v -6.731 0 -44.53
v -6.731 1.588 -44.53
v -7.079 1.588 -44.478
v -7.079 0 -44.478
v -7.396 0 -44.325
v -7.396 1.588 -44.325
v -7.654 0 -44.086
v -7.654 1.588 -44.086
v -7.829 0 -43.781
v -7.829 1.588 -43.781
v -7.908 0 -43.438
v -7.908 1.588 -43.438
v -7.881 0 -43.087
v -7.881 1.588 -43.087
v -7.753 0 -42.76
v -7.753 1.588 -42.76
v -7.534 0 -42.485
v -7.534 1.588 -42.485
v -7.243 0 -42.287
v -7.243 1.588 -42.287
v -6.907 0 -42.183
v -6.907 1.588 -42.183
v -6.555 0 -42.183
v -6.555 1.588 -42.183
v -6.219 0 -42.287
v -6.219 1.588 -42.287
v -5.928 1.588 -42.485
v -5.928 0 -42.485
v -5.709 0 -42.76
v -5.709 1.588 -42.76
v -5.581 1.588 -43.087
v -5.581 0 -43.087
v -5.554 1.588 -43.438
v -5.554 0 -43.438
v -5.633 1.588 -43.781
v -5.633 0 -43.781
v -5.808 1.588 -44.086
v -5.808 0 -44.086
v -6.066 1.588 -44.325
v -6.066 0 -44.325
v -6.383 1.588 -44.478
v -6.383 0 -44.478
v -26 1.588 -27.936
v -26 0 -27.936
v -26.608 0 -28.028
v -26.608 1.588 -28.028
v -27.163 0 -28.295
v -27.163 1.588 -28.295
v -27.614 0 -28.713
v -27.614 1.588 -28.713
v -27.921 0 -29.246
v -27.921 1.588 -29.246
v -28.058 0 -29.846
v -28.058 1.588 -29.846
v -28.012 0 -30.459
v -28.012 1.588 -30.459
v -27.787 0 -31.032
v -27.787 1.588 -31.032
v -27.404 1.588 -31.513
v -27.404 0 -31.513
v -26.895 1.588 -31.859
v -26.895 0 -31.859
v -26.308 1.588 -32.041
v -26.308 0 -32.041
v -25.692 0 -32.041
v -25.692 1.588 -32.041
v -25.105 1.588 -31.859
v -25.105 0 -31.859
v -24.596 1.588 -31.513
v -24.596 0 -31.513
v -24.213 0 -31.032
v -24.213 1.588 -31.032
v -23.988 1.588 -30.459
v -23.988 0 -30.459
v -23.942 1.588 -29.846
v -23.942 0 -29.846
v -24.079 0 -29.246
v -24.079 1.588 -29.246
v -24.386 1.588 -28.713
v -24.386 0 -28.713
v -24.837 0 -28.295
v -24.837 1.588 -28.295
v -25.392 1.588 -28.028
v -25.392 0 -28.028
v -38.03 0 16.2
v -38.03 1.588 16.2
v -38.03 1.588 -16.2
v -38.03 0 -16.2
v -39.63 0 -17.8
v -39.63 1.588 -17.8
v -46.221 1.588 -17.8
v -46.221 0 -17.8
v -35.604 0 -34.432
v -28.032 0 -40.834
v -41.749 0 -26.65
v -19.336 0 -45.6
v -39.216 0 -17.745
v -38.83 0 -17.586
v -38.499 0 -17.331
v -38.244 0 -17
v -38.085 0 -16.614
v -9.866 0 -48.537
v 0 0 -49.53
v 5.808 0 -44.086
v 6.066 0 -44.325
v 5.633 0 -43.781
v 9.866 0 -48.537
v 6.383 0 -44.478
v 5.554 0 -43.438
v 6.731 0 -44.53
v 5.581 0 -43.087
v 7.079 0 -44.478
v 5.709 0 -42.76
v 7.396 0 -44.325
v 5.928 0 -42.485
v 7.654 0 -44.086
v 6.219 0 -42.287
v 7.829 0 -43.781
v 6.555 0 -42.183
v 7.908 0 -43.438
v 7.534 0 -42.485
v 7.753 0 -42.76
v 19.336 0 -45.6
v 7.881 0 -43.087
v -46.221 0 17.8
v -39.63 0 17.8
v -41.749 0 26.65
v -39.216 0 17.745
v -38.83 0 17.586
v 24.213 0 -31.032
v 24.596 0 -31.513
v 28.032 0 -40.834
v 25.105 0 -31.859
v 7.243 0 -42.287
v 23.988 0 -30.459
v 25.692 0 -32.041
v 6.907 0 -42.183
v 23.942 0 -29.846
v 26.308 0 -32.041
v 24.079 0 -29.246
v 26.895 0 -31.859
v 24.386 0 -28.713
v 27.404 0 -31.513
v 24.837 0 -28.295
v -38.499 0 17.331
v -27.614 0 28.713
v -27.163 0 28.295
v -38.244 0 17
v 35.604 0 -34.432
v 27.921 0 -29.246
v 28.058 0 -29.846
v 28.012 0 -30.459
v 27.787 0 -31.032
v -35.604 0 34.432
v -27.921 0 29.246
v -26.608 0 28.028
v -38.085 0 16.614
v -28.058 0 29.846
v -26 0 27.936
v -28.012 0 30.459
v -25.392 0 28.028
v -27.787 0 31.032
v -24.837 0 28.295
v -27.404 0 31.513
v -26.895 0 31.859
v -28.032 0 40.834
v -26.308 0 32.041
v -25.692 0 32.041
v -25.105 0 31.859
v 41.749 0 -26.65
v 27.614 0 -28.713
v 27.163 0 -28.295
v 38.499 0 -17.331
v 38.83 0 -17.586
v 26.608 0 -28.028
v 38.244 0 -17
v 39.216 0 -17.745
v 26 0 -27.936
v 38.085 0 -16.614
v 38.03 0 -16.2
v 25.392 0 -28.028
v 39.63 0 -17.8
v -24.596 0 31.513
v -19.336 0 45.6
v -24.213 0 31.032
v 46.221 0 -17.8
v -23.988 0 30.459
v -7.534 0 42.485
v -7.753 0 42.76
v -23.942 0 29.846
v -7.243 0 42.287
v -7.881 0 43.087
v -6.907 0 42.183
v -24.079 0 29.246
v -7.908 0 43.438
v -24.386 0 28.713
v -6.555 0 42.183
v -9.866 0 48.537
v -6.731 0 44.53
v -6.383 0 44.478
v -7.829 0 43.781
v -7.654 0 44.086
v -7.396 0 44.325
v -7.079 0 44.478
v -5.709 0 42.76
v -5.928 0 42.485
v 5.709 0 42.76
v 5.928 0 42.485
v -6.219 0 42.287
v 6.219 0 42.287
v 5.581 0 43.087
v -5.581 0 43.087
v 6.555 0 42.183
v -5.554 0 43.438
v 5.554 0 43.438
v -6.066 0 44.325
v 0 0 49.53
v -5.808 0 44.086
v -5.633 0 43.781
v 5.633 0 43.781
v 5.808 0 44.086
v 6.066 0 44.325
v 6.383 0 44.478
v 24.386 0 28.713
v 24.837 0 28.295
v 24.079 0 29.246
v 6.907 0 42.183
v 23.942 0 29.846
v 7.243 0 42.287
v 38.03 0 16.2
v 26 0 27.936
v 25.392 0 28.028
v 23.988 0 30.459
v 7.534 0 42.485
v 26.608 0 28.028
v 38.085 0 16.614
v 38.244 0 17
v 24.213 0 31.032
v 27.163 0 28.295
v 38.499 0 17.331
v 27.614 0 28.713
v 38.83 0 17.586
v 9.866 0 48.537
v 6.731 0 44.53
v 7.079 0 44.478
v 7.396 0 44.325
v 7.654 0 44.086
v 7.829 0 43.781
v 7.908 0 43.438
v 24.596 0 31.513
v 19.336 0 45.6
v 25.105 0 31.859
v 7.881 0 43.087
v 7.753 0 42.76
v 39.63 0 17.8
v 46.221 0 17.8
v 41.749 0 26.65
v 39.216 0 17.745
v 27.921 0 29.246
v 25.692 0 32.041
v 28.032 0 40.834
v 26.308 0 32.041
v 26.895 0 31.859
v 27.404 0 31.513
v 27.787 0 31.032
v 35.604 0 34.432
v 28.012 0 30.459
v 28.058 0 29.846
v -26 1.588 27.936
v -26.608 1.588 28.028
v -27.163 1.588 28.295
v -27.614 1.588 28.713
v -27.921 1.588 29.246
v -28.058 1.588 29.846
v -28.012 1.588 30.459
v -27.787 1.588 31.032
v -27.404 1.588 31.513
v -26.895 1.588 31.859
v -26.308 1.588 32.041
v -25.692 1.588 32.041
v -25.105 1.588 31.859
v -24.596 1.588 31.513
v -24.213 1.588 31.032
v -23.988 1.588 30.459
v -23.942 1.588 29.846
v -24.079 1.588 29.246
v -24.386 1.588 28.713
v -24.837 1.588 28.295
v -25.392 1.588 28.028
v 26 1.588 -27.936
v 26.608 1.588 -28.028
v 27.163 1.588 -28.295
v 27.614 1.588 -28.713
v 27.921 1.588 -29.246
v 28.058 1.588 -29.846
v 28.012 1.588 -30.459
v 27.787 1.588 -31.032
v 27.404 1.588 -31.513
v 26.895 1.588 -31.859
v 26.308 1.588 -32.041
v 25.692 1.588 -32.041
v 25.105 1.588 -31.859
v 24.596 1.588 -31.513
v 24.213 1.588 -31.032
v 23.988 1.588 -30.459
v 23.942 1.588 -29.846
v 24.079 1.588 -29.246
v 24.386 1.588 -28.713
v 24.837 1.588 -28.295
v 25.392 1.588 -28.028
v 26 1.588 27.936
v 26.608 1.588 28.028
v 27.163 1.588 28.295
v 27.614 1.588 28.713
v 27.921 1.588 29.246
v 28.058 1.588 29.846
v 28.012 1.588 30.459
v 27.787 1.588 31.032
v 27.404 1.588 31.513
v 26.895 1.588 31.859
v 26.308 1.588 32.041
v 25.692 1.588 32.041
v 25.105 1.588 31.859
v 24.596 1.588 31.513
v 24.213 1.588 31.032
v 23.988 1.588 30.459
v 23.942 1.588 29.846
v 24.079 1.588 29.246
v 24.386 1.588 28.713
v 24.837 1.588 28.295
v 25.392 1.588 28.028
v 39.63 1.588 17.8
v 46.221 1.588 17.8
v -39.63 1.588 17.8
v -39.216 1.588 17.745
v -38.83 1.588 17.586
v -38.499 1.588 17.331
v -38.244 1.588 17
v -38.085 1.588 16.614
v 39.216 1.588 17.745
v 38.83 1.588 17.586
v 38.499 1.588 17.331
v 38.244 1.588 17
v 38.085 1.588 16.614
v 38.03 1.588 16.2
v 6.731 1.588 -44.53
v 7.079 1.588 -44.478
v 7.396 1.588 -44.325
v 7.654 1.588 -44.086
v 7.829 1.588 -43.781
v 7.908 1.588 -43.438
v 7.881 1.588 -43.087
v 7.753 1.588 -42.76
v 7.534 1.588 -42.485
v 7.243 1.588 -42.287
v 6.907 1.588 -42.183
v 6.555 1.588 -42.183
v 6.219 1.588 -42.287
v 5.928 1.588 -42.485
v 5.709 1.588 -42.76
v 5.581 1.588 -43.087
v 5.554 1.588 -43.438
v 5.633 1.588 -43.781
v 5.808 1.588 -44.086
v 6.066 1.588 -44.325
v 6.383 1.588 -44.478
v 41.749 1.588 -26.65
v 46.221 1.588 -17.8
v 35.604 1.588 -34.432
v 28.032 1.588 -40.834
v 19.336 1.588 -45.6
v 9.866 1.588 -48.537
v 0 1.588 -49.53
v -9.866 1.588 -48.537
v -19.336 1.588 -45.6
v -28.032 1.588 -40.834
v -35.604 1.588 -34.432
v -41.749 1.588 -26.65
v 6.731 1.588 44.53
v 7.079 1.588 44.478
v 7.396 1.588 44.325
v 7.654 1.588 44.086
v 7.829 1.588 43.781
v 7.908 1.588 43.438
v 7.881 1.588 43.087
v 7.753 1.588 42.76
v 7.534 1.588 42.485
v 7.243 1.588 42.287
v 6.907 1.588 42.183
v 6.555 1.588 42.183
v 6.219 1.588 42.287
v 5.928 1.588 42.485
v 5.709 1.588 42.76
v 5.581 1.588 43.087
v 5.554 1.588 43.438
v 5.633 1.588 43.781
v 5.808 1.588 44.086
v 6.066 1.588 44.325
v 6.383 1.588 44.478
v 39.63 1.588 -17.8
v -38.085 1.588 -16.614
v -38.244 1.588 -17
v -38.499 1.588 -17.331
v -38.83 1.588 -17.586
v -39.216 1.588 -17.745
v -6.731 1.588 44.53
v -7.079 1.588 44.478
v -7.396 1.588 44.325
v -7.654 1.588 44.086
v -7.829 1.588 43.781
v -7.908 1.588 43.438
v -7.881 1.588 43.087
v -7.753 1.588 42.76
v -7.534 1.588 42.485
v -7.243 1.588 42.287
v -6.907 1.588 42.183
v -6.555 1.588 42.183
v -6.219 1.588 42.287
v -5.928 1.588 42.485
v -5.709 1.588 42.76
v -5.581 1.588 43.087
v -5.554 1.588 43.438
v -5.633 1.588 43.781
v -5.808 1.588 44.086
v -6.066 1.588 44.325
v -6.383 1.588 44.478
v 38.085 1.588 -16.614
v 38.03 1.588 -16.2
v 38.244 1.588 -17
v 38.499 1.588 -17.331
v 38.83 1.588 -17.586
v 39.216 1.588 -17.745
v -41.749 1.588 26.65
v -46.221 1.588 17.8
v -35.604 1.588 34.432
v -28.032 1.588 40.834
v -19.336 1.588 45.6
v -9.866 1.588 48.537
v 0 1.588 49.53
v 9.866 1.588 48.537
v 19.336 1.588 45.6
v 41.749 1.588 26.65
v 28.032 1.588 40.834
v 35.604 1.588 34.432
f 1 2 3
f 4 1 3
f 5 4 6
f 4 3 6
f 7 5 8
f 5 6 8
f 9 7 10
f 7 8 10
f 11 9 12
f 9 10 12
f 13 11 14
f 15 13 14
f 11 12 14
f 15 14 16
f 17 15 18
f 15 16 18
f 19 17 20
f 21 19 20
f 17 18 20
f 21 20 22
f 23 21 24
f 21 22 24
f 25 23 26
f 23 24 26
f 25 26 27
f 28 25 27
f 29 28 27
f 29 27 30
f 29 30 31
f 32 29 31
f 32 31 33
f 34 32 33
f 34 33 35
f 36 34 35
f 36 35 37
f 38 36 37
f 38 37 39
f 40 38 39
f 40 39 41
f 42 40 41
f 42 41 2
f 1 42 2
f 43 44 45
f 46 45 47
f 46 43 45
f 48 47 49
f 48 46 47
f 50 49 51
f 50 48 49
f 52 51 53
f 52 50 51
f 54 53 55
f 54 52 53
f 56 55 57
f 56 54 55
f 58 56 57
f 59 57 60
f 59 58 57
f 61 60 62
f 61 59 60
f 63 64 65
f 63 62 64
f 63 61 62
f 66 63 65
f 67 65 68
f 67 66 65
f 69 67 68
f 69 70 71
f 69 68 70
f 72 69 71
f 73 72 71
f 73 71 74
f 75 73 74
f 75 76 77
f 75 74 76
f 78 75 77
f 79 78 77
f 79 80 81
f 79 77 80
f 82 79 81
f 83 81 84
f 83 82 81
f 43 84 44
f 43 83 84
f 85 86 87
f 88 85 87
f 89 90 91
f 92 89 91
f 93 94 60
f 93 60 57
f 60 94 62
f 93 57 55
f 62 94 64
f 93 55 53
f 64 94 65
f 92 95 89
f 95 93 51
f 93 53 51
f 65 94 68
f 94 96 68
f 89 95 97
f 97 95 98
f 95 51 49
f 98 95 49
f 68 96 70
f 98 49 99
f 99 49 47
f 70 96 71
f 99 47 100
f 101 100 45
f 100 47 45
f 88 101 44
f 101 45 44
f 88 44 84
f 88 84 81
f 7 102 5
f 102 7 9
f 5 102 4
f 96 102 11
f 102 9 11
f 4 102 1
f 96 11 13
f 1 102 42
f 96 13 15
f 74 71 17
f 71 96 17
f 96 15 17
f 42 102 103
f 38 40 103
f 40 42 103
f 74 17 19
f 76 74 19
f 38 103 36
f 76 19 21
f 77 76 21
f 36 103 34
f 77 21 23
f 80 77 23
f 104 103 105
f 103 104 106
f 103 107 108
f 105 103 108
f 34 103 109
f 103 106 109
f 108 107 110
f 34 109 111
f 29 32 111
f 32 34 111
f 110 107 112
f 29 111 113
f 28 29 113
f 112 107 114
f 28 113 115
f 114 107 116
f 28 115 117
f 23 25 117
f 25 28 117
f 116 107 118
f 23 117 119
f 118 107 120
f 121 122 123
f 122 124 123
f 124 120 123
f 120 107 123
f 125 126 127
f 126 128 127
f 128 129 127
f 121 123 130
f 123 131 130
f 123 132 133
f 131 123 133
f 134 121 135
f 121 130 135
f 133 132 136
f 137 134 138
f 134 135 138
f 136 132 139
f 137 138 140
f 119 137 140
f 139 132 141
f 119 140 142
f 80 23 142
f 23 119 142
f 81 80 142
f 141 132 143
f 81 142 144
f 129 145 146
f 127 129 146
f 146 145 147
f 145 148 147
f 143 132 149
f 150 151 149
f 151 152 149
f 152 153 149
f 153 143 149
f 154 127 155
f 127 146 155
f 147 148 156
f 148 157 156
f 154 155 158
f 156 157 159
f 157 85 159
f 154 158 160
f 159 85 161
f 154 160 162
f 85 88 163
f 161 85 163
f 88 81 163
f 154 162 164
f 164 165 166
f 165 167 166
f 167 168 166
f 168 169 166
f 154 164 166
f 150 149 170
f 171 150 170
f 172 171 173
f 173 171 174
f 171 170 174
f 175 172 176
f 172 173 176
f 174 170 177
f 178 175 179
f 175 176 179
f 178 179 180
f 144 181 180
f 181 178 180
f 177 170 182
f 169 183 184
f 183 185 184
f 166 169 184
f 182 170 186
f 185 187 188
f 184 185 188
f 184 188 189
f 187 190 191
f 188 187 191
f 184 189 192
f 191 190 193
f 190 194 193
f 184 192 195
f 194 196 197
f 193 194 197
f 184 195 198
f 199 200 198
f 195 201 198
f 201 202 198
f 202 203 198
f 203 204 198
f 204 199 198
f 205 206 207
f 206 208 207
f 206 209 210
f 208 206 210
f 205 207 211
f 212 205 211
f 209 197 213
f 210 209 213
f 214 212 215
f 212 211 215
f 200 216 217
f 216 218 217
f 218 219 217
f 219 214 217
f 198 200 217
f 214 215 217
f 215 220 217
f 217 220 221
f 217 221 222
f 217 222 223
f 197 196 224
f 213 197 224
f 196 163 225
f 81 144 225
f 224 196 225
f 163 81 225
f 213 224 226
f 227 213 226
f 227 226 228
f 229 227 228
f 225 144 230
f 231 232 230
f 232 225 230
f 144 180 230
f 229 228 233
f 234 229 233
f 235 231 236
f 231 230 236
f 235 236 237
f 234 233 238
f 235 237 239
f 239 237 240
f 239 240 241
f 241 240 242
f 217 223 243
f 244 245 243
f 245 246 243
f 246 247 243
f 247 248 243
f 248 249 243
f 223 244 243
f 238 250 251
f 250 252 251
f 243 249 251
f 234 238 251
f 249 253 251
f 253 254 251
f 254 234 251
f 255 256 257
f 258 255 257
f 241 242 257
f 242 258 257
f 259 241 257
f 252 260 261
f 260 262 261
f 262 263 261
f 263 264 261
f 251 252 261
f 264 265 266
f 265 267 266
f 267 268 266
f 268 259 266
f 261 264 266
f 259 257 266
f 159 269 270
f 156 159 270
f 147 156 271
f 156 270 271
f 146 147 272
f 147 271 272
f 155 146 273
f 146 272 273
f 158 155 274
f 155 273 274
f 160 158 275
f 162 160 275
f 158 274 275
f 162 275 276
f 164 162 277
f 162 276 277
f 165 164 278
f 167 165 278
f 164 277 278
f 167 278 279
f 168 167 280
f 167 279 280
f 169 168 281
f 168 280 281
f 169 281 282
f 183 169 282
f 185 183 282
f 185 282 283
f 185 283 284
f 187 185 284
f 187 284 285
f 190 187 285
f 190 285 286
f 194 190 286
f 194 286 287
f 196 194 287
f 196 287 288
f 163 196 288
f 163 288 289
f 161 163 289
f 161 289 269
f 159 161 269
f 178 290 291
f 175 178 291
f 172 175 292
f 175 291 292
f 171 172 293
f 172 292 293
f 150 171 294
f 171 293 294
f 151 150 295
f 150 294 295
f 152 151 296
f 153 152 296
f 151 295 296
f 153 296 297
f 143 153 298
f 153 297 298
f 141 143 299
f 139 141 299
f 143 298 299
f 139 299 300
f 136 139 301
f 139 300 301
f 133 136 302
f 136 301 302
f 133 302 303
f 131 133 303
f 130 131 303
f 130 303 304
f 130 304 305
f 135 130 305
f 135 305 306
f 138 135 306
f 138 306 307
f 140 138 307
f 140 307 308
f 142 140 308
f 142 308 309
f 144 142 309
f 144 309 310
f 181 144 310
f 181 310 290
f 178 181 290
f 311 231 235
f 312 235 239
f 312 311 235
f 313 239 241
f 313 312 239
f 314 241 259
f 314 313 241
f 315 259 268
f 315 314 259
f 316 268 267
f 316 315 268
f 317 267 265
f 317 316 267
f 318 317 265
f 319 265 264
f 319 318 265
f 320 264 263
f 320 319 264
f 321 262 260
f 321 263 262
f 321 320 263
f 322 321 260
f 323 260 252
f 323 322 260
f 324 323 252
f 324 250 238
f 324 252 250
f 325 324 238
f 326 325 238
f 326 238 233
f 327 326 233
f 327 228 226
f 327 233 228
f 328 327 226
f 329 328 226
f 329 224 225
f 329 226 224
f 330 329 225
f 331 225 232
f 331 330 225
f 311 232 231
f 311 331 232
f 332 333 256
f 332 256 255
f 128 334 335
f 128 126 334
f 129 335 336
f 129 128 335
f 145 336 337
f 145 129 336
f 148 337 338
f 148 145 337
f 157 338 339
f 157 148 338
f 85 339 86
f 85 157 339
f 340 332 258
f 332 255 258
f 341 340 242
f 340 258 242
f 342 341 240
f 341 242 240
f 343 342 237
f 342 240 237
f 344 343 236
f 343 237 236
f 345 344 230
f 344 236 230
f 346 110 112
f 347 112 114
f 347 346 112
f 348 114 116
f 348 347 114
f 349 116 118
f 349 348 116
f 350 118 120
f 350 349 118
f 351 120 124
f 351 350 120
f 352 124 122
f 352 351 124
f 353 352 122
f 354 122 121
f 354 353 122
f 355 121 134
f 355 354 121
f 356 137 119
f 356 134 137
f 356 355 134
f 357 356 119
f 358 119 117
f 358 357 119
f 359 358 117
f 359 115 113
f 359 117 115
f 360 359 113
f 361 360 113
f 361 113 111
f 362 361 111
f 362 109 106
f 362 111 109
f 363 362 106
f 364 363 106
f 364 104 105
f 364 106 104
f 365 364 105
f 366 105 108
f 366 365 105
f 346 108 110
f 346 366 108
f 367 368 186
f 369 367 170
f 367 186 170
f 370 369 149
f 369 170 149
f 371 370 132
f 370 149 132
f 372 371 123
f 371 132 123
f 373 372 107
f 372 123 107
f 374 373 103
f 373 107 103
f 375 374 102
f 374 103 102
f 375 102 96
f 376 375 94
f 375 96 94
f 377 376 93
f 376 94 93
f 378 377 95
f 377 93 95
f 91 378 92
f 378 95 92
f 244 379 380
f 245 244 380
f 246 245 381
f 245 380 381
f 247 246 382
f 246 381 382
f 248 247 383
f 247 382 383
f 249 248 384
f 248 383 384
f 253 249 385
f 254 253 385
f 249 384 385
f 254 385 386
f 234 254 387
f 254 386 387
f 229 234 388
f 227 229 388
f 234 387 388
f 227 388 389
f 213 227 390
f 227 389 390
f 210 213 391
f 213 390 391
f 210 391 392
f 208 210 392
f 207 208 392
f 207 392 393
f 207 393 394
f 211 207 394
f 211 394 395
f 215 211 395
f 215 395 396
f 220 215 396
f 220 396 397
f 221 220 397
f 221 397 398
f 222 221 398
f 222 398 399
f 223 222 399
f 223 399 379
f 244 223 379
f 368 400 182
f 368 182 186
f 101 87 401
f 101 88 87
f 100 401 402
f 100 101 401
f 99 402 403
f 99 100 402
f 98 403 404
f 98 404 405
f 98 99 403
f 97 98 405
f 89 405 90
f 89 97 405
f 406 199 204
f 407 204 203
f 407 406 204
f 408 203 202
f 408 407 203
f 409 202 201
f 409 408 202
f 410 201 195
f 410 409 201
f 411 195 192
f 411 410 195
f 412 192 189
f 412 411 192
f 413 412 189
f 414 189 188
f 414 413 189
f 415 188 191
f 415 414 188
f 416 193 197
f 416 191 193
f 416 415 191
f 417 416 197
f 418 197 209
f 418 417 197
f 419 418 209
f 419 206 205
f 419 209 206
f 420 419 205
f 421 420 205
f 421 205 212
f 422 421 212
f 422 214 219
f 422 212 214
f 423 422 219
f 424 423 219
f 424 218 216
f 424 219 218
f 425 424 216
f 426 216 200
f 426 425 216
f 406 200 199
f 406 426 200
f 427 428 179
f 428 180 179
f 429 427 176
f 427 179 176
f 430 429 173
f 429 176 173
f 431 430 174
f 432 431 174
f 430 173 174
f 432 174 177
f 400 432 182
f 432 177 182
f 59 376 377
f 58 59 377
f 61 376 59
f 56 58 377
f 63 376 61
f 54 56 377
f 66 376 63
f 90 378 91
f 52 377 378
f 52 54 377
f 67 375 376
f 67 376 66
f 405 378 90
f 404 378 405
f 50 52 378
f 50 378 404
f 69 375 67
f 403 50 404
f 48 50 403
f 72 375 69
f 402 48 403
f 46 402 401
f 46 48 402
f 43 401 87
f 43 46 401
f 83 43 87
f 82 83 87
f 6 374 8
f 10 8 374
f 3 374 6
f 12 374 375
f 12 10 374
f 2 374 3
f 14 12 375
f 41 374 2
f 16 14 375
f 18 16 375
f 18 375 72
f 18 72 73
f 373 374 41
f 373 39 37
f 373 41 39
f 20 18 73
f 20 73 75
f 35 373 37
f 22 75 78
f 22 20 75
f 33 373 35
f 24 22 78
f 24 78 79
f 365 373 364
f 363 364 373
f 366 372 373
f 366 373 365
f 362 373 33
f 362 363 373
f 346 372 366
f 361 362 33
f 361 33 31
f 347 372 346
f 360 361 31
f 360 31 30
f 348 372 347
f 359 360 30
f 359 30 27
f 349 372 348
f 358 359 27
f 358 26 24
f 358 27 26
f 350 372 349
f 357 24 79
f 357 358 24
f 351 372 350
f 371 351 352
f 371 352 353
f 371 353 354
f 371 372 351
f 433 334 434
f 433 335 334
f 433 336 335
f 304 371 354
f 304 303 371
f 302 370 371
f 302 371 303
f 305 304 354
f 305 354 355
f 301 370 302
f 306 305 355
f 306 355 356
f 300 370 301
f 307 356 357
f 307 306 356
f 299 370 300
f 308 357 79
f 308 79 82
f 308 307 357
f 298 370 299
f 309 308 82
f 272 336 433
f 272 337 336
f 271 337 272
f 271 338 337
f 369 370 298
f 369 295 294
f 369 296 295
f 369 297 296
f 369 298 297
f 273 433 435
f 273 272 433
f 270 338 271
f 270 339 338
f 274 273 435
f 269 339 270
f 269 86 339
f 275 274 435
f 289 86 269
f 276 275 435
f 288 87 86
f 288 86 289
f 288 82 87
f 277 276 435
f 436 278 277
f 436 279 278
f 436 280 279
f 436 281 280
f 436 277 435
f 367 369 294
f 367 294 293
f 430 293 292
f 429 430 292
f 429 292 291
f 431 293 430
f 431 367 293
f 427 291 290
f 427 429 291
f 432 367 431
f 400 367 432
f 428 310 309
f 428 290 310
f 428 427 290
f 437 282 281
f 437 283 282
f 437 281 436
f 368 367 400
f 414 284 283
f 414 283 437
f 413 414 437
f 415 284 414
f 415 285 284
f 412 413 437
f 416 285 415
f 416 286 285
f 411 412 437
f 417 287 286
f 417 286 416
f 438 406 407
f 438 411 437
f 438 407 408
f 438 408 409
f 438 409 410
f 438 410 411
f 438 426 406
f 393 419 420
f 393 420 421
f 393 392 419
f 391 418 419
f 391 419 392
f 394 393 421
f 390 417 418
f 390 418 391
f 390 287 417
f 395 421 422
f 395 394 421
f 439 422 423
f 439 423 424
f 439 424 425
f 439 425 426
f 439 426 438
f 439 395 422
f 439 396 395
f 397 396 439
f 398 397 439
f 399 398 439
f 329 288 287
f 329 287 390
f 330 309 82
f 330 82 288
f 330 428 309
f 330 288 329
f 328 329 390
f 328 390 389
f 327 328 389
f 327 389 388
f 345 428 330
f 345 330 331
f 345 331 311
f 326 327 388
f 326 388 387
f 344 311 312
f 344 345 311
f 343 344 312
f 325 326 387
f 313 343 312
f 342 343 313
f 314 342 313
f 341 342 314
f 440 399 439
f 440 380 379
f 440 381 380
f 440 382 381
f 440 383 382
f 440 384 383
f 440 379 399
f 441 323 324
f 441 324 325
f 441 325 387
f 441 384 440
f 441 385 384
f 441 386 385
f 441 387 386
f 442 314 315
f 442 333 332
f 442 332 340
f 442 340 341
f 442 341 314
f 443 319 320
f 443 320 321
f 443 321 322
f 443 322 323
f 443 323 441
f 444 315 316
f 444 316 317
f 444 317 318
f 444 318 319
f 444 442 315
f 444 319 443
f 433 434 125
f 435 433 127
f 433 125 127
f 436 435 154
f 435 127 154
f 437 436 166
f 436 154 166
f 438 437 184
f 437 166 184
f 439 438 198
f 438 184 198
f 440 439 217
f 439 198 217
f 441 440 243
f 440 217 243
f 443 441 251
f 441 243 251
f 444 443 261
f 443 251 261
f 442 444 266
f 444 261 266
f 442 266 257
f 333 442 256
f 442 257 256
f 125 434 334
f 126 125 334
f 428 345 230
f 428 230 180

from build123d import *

# Parameters (mm, degrees)
SKETCH1_R               = 49.53
EXTRUDE1_DEPTH          = 1.5875
SKETCH2_R               = 2.06375
EXTRUDE2_DEPTH          = 10
MIRROR3_COPY_1_SKETCH_R = 2.06375
MIRROR3_COPY_1_DEPTH    = 10
MIRROR3_COPY_2_SKETCH_R = 2.06375
MIRROR3_COPY_2_DEPTH    = 10
CUT_EXTRUDE1_DEPTH      = 71.06398473
FILLET5_R               = 1.6
FILLET5_OF_MIRROR4_R    = 1.6
SKETCH4_R               = 1.18
CUT_EXTRUDE2_DEPTH      = 68.765197235
MIRROR6_COPY_1_SKETCH_R = 1.18
MIRROR6_COPY_1_DEPTH    = 68.765197235
MIRROR6_COPY_2_SKETCH_R = 1.18
MIRROR6_COPY_2_DEPTH    = 68.765197235


with BuildPart() as part:
    # Sketch1 → Extrude1 (new body)
    with BuildSketch(Plane(origin=(0, 0, 0), x_dir=(1, 0, 0), z_dir=(0, 1, 0))):
        Circle(SKETCH1_R)
    extrude(amount=EXTRUDE1_DEPTH)

    # Sketch2 → Extrude2 (cut)
    with BuildSketch(Plane(origin=(0, 1.5875, 0), x_dir=(-1, 0, 0), z_dir=(0, 1, 0))):
        with Locations((-26, -30)):
            Circle(SKETCH2_R)
    extrude2 = extrude(amount=-EXTRUDE2_DEPTH, mode=Mode.SUBTRACT)

    # Mirror1: Extrude2 across plane
    add(extrude2.mirror(Plane(origin=(0, 0, 0), x_dir=(0, 0, 1), z_dir=(1, 0, 0))), mode=Mode.SUBTRACT)

    # Mirror3 copy 1 sketch → Mirror3 copy 1 (cut)
    with BuildSketch(Plane(origin=(0, 1.5875, 0), x_dir=(1, 0, 0), z_dir=(0, 1, 0))):
        with Locations((-26, -30)):
            Circle(MIRROR3_COPY_1_SKETCH_R)
    extrude(amount=-MIRROR3_COPY_1_DEPTH, mode=Mode.SUBTRACT)

    # Mirror3 copy 2 sketch → Mirror3 copy 2 (cut)
    with BuildSketch(Plane(origin=(0, 1.5875, 0), x_dir=(-1, 0, 0), z_dir=(0, 1, 0))):
        with Locations((-26, 30)):
            Circle(MIRROR3_COPY_2_SKETCH_R)
    extrude(amount=-MIRROR3_COPY_2_DEPTH, mode=Mode.SUBTRACT)

    # Sketch3 → Cut-Extrude1 (cut, through all)
    with BuildSketch(Plane(origin=(0, 1.5875, 0), x_dir=(1, 0, 0), z_dir=(0, 1, 0))):
        with BuildLine():
            Line((38.03, 0), (38.03, 17.8))
            Line((38.03, 17.8), (46.221000638, 17.8))
            ThreePointArc((46.221000638, 17.8), (49.53, 0), (46.221000638, -17.8))
            Line((46.221000638, -17.8), (38.03, -17.8))
            Line((38.03, -17.8), (38.03, 0))
        make_face()
    cut_extrude1 = extrude(amount=-CUT_EXTRUDE1_DEPTH, mode=Mode.SUBTRACT)

    # Fillet5
    fillet5_edges = [part.edges().sort_by_distance(p)[0] for p in [
        (38.03, 0.79375, 17.8),
        (38.03, 0.79375, -17.8),
    ]]
    fillet(fillet5_edges, radius=FILLET5_R)

    # Mirror4: Cut-Extrude1 across plane
    add(cut_extrude1.mirror(Plane(origin=(0, 0, 0), x_dir=(0, 0, 1), z_dir=(1, 0, 0))), mode=Mode.SUBTRACT)

    # Fillet5 of Mirror4
    fillet5_of_mirror4_edges = [part.edges().sort_by_distance(p)[0] for p in [
        (-38.03, 0.79375, 17.8),
        (-38.03, 0.79375, -17.8),
    ]]
    fillet(fillet5_of_mirror4_edges, radius=FILLET5_OF_MIRROR4_R)

    # Sketch4 → Cut-Extrude2 (cut, through all)
    with BuildSketch(Plane(origin=(0, 1.5875, 0), x_dir=(1, 0, 0), z_dir=(0, 1, 0))):
        with Locations((6.731, -43.35)):
            Circle(SKETCH4_R)
    cut_extrude2 = extrude(amount=-CUT_EXTRUDE2_DEPTH, mode=Mode.SUBTRACT)

    # Mirror5: Cut-Extrude2 across plane
    add(cut_extrude2.mirror(Plane.XY), mode=Mode.SUBTRACT)

    # Mirror6 copy 1 sketch → Mirror6 copy 1 (cut, through all)
    with BuildSketch(Plane(origin=(0, 1.5875, 0), x_dir=(-1, 0, 0), z_dir=(0, 1, 0))):
        with Locations((6.731, -43.35)):
            Circle(MIRROR6_COPY_1_SKETCH_R)
    extrude(amount=-MIRROR6_COPY_1_DEPTH, mode=Mode.SUBTRACT)

    # Mirror6 copy 2 sketch → Mirror6 copy 2 (cut, through all)
    with BuildSketch(Plane(origin=(0, 1.5875, 0), x_dir=(-1, 0, 0), z_dir=(0, 1, 0))):
        with Locations((6.731, 43.35)):
            Circle(MIRROR6_COPY_2_SKETCH_R)
    extrude(amount=-MIRROR6_COPY_2_DEPTH, mode=Mode.SUBTRACT)


solid = part.part
